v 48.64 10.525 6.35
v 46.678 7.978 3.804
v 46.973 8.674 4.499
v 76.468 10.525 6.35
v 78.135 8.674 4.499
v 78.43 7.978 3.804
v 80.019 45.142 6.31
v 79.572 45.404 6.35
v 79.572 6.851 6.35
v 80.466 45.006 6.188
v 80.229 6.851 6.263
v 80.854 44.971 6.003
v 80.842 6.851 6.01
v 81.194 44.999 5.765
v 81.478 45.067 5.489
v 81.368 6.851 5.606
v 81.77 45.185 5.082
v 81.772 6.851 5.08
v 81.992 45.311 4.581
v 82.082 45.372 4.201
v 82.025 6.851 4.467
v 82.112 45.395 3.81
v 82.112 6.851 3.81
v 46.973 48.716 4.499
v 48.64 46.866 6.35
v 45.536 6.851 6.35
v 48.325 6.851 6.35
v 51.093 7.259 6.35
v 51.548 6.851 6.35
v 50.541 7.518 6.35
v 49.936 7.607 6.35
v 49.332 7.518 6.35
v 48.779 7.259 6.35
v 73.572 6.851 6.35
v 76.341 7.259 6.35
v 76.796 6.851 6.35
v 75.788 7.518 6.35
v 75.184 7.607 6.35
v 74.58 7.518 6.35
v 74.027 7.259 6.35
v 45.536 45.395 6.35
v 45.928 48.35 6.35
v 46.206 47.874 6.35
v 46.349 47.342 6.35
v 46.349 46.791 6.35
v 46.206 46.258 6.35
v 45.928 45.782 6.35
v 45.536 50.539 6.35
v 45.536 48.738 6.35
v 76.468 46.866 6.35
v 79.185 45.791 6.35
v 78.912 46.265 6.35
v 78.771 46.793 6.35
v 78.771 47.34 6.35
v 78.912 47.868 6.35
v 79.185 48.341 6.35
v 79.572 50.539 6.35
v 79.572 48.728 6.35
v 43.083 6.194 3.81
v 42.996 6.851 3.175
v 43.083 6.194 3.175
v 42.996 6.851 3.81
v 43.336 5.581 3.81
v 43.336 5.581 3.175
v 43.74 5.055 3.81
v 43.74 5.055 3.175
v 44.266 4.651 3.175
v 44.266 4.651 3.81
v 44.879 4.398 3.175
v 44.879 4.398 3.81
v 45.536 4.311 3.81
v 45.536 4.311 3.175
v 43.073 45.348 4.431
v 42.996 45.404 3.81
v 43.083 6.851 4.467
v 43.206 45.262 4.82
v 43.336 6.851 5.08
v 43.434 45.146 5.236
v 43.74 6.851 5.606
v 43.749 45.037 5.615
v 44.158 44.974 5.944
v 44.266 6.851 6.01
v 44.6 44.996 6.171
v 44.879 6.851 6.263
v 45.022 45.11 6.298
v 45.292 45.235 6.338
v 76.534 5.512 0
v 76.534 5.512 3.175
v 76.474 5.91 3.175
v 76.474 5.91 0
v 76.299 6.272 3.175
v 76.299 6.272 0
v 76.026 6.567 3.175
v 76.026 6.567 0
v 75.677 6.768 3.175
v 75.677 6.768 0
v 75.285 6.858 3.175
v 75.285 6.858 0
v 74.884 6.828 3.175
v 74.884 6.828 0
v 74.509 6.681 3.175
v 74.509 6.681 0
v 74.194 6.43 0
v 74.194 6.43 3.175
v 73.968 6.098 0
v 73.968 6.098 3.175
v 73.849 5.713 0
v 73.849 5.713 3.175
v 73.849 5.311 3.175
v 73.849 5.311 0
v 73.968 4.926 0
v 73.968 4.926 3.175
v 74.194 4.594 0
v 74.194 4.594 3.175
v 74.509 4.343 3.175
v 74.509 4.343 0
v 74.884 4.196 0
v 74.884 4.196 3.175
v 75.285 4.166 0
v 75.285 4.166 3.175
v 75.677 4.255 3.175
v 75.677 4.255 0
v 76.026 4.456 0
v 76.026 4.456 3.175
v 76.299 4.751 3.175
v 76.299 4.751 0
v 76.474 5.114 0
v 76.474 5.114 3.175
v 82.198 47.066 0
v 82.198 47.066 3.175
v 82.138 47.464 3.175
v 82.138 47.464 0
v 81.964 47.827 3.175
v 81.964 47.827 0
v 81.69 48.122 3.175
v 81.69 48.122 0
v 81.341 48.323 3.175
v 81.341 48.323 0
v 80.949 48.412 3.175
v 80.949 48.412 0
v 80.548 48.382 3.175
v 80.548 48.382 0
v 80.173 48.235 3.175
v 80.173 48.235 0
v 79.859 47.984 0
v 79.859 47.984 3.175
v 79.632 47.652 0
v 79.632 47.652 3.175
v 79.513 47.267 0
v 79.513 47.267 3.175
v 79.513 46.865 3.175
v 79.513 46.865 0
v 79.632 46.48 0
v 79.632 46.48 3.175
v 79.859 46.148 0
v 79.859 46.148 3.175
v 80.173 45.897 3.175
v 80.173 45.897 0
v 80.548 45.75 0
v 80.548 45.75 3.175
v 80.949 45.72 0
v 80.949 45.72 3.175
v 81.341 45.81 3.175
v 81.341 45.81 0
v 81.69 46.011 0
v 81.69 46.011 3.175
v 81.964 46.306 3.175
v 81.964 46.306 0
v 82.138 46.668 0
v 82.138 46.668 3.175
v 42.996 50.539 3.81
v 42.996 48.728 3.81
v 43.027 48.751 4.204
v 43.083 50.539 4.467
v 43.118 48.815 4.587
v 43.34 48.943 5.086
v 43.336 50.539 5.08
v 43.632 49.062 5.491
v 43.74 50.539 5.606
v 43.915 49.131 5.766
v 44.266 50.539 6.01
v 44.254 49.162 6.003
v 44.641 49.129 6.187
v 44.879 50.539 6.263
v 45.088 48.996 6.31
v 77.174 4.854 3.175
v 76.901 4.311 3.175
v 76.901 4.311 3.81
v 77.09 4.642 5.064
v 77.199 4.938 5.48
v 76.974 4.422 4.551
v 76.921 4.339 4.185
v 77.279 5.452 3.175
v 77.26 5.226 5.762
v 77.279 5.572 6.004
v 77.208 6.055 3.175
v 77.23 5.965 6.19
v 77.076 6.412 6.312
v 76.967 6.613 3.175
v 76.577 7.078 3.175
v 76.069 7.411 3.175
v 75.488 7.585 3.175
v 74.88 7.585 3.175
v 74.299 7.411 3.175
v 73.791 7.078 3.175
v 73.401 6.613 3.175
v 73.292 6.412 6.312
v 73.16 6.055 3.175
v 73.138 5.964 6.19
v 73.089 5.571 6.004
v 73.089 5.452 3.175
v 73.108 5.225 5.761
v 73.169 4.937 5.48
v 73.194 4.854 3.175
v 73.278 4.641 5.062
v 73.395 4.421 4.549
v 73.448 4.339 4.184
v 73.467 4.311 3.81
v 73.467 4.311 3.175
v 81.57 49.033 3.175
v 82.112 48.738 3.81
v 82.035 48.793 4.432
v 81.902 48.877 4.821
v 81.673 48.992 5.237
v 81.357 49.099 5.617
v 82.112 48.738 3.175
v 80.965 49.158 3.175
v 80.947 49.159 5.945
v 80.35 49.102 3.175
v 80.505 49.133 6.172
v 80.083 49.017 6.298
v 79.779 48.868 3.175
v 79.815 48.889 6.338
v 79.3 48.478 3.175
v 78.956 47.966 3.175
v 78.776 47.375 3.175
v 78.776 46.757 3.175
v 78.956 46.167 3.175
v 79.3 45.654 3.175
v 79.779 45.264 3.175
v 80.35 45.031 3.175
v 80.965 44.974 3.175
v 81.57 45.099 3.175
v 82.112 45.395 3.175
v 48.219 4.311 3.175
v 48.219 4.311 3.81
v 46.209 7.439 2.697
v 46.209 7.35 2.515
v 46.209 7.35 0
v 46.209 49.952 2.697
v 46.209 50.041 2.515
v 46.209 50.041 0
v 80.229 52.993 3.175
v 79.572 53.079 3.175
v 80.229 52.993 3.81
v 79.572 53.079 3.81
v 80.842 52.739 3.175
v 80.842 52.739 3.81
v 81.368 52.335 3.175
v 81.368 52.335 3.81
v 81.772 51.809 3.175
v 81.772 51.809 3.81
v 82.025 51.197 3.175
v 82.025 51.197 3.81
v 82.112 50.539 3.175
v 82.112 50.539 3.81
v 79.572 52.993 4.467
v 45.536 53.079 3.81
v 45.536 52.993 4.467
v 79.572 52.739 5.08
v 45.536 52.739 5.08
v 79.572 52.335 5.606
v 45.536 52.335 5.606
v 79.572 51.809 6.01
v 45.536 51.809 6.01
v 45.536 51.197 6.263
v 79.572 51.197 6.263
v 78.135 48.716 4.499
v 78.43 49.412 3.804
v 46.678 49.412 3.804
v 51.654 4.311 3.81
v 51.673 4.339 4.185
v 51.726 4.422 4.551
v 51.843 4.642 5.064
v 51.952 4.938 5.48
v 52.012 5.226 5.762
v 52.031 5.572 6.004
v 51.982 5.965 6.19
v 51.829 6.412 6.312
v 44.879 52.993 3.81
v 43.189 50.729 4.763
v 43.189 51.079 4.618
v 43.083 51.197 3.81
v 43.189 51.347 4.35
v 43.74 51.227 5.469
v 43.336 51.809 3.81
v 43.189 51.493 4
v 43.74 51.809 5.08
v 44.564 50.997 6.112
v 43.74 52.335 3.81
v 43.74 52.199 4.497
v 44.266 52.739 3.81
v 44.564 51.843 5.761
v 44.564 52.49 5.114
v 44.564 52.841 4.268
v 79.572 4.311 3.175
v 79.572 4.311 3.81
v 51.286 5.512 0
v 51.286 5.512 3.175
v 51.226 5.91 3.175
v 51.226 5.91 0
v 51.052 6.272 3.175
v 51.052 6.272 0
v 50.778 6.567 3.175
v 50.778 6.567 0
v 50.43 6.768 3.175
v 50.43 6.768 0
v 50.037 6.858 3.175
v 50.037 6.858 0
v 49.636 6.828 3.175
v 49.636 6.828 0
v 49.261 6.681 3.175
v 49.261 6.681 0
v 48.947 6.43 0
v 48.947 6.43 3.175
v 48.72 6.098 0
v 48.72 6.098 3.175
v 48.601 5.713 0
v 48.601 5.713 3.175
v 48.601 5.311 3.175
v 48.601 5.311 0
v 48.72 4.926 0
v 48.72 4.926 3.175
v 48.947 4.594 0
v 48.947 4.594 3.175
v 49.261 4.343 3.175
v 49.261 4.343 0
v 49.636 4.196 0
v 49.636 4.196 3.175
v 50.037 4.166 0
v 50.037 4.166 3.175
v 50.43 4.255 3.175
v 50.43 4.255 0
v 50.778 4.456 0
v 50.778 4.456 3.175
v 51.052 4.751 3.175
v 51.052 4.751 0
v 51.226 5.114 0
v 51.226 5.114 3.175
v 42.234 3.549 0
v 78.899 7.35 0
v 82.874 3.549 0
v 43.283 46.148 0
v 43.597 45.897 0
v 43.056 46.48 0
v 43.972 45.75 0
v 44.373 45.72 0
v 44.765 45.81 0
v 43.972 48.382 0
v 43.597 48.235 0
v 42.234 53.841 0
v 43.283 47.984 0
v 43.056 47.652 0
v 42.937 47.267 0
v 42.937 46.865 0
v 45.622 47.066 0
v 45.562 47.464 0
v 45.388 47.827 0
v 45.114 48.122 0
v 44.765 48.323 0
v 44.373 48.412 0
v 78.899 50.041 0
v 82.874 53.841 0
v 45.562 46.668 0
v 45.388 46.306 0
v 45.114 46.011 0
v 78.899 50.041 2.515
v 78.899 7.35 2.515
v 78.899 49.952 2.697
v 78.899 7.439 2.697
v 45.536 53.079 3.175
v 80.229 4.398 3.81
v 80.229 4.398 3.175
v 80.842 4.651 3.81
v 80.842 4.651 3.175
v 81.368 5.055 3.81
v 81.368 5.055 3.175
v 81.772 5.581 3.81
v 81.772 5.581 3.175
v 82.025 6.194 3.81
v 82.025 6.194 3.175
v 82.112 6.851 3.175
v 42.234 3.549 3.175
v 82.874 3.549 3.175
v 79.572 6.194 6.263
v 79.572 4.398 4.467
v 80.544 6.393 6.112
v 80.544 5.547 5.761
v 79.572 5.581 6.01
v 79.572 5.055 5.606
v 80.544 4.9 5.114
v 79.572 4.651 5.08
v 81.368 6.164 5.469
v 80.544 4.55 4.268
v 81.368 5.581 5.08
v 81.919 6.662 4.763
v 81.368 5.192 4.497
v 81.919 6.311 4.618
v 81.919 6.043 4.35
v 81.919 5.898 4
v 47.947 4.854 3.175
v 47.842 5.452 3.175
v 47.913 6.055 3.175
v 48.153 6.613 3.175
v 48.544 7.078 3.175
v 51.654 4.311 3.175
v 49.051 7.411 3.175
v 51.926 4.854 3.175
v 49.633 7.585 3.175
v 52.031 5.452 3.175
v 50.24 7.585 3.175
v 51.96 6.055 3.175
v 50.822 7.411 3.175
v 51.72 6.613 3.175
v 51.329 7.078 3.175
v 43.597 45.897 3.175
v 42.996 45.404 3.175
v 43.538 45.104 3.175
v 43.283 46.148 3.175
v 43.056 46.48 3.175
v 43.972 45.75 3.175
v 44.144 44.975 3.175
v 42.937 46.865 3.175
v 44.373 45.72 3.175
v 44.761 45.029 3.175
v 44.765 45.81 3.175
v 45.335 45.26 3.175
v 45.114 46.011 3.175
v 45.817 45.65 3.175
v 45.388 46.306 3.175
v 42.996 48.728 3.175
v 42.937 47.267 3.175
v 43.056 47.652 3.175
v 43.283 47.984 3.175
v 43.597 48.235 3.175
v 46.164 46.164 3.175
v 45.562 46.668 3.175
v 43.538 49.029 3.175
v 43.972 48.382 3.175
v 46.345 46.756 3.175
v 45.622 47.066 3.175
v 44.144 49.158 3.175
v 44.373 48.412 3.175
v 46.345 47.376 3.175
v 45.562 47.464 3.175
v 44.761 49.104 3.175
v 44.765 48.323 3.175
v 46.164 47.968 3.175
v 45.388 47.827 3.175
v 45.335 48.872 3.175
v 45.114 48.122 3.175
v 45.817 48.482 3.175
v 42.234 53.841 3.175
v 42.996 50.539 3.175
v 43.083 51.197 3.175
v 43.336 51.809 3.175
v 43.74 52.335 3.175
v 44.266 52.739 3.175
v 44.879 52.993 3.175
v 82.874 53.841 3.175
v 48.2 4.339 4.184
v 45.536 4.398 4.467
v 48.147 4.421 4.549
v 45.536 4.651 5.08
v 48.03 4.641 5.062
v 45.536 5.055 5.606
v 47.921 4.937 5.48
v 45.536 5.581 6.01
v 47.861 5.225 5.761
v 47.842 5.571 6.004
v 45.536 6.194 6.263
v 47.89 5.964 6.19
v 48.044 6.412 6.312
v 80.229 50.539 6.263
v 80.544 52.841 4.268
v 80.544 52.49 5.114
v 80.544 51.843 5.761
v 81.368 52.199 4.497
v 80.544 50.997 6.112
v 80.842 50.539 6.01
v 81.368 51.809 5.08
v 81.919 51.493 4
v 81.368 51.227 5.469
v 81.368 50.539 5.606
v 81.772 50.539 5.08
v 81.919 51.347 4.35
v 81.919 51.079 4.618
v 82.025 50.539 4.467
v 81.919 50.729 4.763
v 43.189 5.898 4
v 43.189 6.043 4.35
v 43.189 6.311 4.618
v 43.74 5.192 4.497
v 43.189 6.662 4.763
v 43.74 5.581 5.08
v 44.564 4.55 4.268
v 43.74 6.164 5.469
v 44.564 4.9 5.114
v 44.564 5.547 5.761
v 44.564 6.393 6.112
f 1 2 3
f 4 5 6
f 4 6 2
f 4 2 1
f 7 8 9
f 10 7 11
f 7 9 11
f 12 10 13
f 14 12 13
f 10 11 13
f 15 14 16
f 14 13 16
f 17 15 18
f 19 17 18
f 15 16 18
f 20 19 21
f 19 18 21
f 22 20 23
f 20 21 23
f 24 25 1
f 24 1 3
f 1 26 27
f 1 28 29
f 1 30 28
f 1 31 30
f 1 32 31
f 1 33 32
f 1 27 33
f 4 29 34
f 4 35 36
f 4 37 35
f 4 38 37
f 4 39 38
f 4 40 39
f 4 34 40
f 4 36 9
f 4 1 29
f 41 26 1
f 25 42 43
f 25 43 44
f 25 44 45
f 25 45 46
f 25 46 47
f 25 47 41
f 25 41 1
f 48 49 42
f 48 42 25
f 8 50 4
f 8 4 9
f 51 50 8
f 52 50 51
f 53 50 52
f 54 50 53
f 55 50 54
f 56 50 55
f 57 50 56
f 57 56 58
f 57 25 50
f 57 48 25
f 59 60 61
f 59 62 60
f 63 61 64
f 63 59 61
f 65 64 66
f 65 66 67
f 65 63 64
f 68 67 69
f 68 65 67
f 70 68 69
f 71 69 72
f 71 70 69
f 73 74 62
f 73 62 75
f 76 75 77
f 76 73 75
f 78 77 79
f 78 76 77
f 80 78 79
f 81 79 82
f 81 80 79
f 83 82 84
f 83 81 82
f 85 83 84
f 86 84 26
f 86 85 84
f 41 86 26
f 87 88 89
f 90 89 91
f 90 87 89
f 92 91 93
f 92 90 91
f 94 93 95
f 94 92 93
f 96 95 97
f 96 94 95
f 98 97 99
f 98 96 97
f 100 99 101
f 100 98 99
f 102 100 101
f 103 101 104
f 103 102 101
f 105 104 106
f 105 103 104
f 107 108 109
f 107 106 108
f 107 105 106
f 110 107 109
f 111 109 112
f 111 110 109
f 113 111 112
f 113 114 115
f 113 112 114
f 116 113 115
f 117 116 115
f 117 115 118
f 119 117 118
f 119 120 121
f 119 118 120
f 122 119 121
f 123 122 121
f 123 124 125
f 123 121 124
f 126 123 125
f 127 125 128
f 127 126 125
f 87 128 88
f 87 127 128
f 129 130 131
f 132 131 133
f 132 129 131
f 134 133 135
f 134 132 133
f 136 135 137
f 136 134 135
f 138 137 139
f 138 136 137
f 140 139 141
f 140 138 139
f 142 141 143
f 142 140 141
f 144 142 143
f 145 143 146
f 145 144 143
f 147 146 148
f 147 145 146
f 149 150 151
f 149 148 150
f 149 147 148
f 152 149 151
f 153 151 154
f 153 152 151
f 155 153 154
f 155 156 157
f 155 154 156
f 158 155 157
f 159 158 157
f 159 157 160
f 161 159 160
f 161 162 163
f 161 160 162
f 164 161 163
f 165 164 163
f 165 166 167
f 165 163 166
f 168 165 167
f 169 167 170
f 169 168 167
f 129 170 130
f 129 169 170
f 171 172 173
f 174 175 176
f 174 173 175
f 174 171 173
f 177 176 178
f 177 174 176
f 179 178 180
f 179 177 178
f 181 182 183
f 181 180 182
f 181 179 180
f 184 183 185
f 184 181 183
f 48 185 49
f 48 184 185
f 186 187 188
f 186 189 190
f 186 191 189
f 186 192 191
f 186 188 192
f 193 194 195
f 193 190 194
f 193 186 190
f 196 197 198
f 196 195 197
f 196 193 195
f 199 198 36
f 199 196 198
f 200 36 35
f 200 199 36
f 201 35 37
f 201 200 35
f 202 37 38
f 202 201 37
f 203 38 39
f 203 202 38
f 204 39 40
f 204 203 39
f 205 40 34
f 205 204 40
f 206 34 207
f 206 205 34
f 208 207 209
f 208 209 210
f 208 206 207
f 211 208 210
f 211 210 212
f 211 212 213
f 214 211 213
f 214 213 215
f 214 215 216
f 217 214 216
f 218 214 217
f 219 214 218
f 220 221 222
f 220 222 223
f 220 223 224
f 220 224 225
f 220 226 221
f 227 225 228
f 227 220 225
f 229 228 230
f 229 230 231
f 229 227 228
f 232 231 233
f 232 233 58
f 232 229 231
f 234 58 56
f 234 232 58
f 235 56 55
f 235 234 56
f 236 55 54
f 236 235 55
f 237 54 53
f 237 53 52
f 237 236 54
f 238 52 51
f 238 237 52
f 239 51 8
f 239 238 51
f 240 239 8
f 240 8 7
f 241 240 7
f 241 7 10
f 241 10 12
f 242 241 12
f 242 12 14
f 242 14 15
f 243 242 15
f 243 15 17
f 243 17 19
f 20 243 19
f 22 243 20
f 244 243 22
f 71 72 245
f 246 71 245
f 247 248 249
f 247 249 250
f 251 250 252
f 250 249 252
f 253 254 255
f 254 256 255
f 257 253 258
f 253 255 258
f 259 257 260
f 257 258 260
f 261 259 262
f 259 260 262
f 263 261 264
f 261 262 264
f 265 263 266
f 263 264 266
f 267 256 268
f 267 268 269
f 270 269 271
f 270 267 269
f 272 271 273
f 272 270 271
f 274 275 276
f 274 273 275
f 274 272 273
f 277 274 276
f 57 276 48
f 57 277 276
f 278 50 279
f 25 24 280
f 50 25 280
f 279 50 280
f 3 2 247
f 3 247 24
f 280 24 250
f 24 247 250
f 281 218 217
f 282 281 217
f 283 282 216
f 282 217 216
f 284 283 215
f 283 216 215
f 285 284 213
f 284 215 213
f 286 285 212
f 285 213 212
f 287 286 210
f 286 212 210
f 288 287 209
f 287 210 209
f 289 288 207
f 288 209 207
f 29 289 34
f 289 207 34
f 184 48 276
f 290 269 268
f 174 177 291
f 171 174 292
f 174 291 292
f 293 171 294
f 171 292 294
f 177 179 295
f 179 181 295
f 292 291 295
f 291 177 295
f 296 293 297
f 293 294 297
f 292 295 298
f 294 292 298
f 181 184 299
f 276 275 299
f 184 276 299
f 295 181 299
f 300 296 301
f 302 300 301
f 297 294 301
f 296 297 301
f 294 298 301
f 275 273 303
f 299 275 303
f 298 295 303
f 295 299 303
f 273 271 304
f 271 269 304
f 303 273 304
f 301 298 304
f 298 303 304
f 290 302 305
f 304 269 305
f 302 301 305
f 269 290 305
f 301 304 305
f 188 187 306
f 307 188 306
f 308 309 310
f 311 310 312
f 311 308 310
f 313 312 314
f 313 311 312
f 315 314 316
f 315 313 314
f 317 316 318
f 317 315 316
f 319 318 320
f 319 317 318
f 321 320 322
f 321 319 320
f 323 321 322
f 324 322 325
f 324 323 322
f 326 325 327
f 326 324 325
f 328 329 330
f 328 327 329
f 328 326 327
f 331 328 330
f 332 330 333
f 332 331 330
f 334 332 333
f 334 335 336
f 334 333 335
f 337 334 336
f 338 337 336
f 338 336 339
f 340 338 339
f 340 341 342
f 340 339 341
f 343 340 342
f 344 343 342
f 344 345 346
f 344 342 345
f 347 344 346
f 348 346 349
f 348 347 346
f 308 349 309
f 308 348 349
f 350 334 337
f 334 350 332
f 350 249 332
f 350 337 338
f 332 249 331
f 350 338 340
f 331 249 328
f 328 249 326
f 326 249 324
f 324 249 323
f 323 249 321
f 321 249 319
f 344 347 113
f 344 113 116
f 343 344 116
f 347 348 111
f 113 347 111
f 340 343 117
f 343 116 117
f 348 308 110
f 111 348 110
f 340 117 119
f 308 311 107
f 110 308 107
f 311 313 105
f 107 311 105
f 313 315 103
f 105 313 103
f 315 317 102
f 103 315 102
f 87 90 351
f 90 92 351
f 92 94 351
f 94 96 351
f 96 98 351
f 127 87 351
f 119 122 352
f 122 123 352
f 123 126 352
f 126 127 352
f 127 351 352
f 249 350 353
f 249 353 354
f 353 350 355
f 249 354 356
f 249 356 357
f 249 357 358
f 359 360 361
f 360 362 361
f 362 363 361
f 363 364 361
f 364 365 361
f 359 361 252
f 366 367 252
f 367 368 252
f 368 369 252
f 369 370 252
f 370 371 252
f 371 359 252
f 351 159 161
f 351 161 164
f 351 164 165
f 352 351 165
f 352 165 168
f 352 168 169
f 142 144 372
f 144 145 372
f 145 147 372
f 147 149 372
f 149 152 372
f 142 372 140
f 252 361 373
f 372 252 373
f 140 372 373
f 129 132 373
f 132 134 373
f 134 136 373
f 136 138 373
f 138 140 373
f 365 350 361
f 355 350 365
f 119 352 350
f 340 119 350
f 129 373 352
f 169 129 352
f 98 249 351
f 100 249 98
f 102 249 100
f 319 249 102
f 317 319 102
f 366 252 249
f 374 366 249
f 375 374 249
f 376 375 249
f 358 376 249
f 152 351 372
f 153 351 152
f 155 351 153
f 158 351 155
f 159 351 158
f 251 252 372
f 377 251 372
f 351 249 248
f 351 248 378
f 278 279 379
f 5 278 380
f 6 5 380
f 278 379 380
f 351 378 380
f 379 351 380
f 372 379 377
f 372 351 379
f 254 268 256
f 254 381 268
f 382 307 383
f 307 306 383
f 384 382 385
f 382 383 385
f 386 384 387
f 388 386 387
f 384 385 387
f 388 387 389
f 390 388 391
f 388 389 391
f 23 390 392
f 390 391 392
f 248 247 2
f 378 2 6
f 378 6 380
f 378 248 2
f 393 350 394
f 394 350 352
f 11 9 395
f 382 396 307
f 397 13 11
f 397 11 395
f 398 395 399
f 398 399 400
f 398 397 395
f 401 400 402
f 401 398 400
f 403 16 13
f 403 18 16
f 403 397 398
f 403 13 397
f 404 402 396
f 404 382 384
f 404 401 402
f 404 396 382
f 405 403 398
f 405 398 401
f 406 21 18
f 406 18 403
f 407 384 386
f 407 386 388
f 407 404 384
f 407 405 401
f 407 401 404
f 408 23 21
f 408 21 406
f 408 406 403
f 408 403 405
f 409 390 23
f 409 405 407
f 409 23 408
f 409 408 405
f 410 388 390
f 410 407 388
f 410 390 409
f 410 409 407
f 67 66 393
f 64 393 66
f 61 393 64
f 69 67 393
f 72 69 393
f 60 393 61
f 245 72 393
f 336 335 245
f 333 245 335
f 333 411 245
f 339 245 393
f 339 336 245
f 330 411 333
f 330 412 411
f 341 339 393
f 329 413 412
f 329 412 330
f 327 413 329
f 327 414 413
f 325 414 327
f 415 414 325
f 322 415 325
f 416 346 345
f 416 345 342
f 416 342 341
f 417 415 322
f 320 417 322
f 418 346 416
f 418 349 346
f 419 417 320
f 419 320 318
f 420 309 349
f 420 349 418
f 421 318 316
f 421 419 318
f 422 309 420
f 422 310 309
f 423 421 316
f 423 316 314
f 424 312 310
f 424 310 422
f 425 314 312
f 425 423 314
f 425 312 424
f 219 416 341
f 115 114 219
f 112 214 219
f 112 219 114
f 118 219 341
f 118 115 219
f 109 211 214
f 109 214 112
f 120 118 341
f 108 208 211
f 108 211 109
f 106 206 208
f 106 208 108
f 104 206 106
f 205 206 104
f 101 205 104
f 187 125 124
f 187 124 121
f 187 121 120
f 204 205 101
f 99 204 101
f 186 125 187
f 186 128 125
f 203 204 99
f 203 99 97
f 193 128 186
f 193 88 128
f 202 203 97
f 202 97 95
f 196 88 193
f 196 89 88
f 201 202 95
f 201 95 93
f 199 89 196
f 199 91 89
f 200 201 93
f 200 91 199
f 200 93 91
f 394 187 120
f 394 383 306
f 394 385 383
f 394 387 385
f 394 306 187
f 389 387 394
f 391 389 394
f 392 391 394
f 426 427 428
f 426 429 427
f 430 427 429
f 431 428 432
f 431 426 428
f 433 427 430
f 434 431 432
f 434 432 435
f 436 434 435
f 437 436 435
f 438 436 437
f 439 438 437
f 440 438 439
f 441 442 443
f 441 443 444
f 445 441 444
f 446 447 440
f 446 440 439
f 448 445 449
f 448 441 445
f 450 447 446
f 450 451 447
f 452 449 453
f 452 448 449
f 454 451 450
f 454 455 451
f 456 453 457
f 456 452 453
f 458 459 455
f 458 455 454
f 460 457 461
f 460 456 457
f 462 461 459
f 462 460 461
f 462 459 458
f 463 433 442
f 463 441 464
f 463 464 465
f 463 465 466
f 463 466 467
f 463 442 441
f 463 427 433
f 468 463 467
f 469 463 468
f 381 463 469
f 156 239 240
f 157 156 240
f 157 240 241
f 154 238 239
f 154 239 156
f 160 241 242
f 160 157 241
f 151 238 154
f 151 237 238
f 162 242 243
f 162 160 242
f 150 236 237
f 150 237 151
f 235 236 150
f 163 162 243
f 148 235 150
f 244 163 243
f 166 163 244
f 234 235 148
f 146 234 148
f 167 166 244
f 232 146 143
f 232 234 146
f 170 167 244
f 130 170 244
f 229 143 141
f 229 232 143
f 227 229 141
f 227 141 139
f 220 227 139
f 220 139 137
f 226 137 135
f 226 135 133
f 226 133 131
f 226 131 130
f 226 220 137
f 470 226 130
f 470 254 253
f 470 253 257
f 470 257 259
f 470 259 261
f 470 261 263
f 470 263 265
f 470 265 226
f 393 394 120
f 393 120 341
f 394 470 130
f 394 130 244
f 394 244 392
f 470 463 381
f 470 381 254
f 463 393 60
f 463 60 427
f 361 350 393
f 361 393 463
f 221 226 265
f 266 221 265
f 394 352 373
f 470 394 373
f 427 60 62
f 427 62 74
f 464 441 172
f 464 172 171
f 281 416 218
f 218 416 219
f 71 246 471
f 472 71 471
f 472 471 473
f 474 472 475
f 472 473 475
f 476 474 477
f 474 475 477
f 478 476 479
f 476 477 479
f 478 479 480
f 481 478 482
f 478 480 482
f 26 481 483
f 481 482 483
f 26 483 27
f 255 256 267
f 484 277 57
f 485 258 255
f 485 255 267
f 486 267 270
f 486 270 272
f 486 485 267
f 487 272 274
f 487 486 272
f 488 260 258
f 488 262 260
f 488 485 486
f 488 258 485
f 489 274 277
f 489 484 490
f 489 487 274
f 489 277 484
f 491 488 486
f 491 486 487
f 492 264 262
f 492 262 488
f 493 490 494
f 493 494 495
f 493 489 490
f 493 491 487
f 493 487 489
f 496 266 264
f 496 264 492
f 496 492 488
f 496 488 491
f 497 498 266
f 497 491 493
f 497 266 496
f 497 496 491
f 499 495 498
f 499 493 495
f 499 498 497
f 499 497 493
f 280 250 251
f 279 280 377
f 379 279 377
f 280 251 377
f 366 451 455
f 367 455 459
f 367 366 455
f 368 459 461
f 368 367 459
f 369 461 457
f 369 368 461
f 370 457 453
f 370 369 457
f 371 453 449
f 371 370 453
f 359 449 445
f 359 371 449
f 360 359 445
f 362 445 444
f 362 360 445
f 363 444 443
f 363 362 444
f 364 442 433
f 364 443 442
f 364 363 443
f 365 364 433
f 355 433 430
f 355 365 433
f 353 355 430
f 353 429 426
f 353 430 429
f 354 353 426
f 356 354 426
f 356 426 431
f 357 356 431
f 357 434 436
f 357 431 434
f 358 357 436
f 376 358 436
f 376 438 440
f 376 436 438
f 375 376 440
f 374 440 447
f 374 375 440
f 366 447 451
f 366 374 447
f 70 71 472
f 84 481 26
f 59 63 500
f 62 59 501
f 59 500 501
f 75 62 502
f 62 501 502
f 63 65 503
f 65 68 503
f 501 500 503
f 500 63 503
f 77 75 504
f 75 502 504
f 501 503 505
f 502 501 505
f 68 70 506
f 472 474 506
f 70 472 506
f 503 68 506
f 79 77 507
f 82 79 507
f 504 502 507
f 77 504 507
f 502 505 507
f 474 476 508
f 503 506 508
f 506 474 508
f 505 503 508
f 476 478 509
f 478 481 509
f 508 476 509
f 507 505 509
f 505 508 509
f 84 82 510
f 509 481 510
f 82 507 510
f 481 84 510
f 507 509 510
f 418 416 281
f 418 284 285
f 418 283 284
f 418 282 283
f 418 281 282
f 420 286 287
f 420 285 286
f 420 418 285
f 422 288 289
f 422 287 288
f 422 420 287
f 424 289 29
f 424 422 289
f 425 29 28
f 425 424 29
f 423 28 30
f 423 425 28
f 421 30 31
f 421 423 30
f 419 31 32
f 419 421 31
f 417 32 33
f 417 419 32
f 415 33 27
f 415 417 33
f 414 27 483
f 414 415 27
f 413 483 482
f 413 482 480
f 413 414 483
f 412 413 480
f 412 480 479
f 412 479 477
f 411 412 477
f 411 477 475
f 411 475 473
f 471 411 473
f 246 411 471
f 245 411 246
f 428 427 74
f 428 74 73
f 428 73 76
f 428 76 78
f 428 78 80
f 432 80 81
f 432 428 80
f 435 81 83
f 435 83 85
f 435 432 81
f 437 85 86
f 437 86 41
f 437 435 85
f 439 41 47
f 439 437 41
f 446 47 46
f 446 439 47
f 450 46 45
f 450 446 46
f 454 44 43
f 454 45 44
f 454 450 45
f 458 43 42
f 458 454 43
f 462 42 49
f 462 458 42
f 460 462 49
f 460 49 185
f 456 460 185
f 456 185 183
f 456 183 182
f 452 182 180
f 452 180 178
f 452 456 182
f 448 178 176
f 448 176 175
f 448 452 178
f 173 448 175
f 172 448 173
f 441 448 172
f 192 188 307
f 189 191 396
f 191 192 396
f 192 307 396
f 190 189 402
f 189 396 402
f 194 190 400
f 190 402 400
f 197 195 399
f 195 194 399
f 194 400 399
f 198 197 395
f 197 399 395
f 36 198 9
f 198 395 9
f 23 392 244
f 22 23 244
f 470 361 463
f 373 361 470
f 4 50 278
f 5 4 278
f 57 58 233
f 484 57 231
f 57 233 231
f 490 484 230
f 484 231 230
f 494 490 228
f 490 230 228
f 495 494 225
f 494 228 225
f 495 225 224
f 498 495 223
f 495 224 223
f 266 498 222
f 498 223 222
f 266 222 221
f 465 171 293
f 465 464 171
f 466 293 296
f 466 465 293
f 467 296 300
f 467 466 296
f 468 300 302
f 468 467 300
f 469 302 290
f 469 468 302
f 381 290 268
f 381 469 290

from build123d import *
from OCP.BRepFilletAPI import BRepFilletAPI_MakeChamfer

# Parameters (mm, degrees)
MODEL_W             = 40.64000000000001
MODEL_H             = 50.291999999999994
MODEL_R             = 1.3499999999999979
MODEL_R_2           = 1.3499999999999985
MODEL_R_3           = 1.3500000000000056
MODEL_R_4           = 1.3500000000000065
MODEL_W_2           = 32.69080000000003
MODEL_H_2           = 42.690799999999996
BOSS_EXTRUDE1_DEPTH = 3.175
SKETCH1_W           = 32.69080000000003
SKETCH1_H           = 42.690799999999996
SKETCH1_W_2         = 27.828239916797088
SKETCH1_H_2         = 36.340799999999994
BOSS_EXTRUDE2_DEPTH = 3.175
SKETCH2_W           = 39.116000000000014
SKETCH2_H           = 48.768
SKETCH2_W_2         = 32.69080000000003
SKETCH2_H_2         = 42.690799999999996
BOSS_EXTRUDE4_DEPTH = 3.175
FILLET1_R           = 2.54
FILLET2_R           = 2.54
CHAMFER9_SIZE       = 3.175
CHAMFER9_SIZE_2     = 2.858782841
CHAMFER10_SIZE      = 3.175
SKETCH4_R           = 1.3500000000000065
SKETCH4_R_2         = 1.3499999999999979
SKETCH4_R_3         = 1.3499999999999985
SKETCH4_R_4         = 1.3500000000000056
CUT_EXTRUDE1_DEPTH  = 100.03179502787644
CHAMFER11_SIZE      = 0.889
CHAMFER11_SIZE2     = 0.6602398251627483
CHAMFER12_SIZE      = 1.143
CHAMFER12_SIZE2     = 0.9523797142277386
CUT_EXTRUDE2_START  = -3.175
SKETCH5_R           = 2.0955000000000017
SKETCH5_R_2         = 2.095500000000001
CUT_EXTRUDE2_DEPTH  = 3.175


with BuildPart() as part:
    # Model → Boss-Extrude1 (new body)
    with BuildSketch(Plane.XY):
        with Locations((62.55399712221356, 28.695197306808385)):
            Rectangle(MODEL_W, MODEL_H)
        with Locations((44.272200000000005, 47.066199999999995)):
            Circle(MODEL_R, mode=Mode.SUBTRACT)
        with Locations((49.9364, 5.5118)):
            Circle(MODEL_R_2, mode=Mode.SUBTRACT)
        with Locations((75.184, 5.5118)):
            Circle(MODEL_R_3, mode=Mode.SUBTRACT)
        with Locations((80.84819999999999, 47.066199999999995)):
            Circle(MODEL_R_4, mode=Mode.SUBTRACT)
        with Locations((62.55399712221356, 28.69519730680839)):
            Rectangle(MODEL_W_2, MODEL_H_2, mode=Mode.SUBTRACT)
    extrude(amount=BOSS_EXTRUDE1_DEPTH)



with BuildPart() as body_2:
    # Sketch1 → Boss-Extrude2 (new body)
    with BuildSketch(Plane.XY.offset(3.175)):
        with Locations((62.55399712221356, 28.69519730680839)):
            Rectangle(SKETCH1_W, SKETCH1_H)
        with Locations((62.55399712221356, 28.695197306808385)):
            Rectangle(SKETCH1_W_2, SKETCH1_H_2, mode=Mode.SUBTRACT)
    extrude(amount=BOSS_EXTRUDE2_DEPTH)


with BuildPart() as part_1:
    add(part.part)

    add(body_2.part)  # Boss-Extrude4 merges body 2
    # Sketch2 → Boss-Extrude4 (add)
    with BuildSketch(Plane.XY.offset(3.175)):
        with Locations((62.55399712221356, 28.69519730680838)):
            Rectangle(SKETCH2_W, SKETCH2_H)
        with Locations((62.55399712221356, 28.69519730680839)):
            Rectangle(SKETCH2_W_2, SKETCH2_H_2, mode=Mode.SUBTRACT)
    extrude(amount=BOSS_EXTRUDE4_DEPTH)

    # Fillet1
    fillet1_edges = [part_1.edges().sort_by_distance(p)[0] for p in [
        (62.55399712221356, 4.311197306808385, 6.35),
        (62.55399712221356, 53.07919730680838, 6.35),
    ]]
    fillet(fillet1_edges, radius=FILLET1_R)

    # Fillet2
    fillet2_edges = [part_1.edges().sort_by_distance(p)[0] for p in [
        (82.11199712221357, 52.335248531022216, 5.6060512242138305),
        (82.11199712221357, 5.055146082594554, 5.606051224213831),
        (42.99599712221355, 4.311197306808385, 3.4924999999999997),
        (42.99599712221355, 53.07919730680838, 3.4924999999999997),
        (42.99599712221355, 52.33524853102221, 5.606051224213832),
        (42.99599712221355, 5.055146082594553, 5.6060512242138305),
        (42.99599712221355, 28.69519730680838, 6.35),
        (82.11199712221357, 28.695197306808385, 6.35),
        (82.11199712221357, 53.07919730680838, 3.4924999999999997),
        (82.11199712221357, 4.311197306808385, 3.4924999999999997),
    ]]
    fillet(fillet2_edges, radius=FILLET2_R)

    # Chamfer9
    # the kernel refuses this chamfer: 3.175, 2.858782841 mm, written as the material it takes off along each edge
    with BuildSketch(Plane(origin=(48.639877163815015, 46.86559730680839, 3.175), x_dir=(0, 0, 1), z_dir=(0, -1, 0))) as chamfer9_piece_1_section:
        Polygon((CHAMFER9_SIZE, 0), (0, CHAMFER9_SIZE_2), (0, 0), align=None)
    chamfer9_piece_1 = extrude(amount=36.3408, mode=Mode.PRIVATE)
    chamfer9_piece_1 = split(chamfer9_piece_1, bisect_by=Plane(origin=(46.20859712221354, 46.86559730680839, 3.175), z_dir=(1, 0, 0)), keep=Keep.TOP, mode=Mode.PRIVATE)
    add(chamfer9_piece_1, mode=Mode.SUBTRACT)
    with BuildSketch(Plane(origin=(76.4681170806121, 10.524797306808388, 3.175), x_dir=(0, 0, 1), z_dir=(0, 1, 0))) as chamfer9_piece_2_section:
        Polygon((CHAMFER9_SIZE, 0), (0, CHAMFER9_SIZE_2), (0, 0), align=None)
    chamfer9_piece_2 = extrude(amount=36.3408, mode=Mode.PRIVATE)
    chamfer9_piece_2 = split(chamfer9_piece_2, bisect_by=Plane(origin=(78.89939712221357, 10.524797306808388, 3.175), z_dir=(-1, 0, 0)), keep=Keep.TOP, mode=Mode.PRIVATE)
    add(chamfer9_piece_2, mode=Mode.SUBTRACT)

    # Chamfer10
    # the kernel refuses this chamfer: 3.175 mm, written as the material it takes off along each edge
    with BuildSketch(Plane(origin=(46.208597122214, 46.865597306808, 3.175), x_dir=(0, 1.2309e-13, 1), z_dir=(1, 0, 0))) as chamfer10_piece_1_section:
        Polygon((CHAMFER10_SIZE, 0), (3.908e-13, -CHAMFER10_SIZE), (0, 0), align=None)
    chamfer10_piece_1 = extrude(amount=32.690799999999996, mode=Mode.PRIVATE)
    chamfer10_piece_1 = split(chamfer10_piece_1, bisect_by=Plane(origin=(64.4986511687098, 46.865597306808, 19.643438635932224), z_dir=(-0.7431448254361507, 0, -0.6691306064046639)), keep=Keep.TOP, mode=Mode.PRIVATE)
    chamfer10_piece_1 = split(chamfer10_piece_1, bisect_by=Plane(origin=(45.97250261720881, 46.865597306808, 3.387580447169522), z_dir=(0.7431448254361507, 0, -0.6691306064046639)), keep=Keep.TOP, mode=Mode.PRIVATE)
    add(chamfer10_piece_1, mode=Mode.SUBTRACT)
    with BuildSketch(Plane(origin=(78.899397122214, 10.524797306808, 3.175), x_dir=(1.1e-16, -1, 0), z_dir=(-1, -1.1e-16, 0))) as chamfer10_piece_2_section:
        Polygon((CHAMFER10_SIZE, 0), (-3.908e-13, CHAMFER10_SIZE), (0, 0), align=None)
    chamfer10_piece_2 = extrude(amount=32.690799999999996, mode=Mode.PRIVATE)
    chamfer10_piece_2 = split(chamfer10_piece_2, bisect_by=Plane(origin=(79.13549162721864, 10.524797306808, 3.38758044716903), z_dir=(-0.7431448254361507, 0, -0.6691306064046639)), keep=Keep.TOP, mode=Mode.PRIVATE)
    chamfer10_piece_2 = split(chamfer10_piece_2, bisect_by=Plane(origin=(60.609343075717646, 10.524797306808, 19.64343863593272), z_dir=(0.7431448254361507, 0, -0.6691306064046639)), keep=Keep.TOP, mode=Mode.PRIVATE)
    add(chamfer10_piece_2, mode=Mode.SUBTRACT)

    # Sketch4 → Cut-Extrude1 (cut, through all)
    with BuildSketch(Plane(origin=(0, 0, 0), x_dir=(-1, 0, 0), z_dir=(0, 0, -1))):
        with Locations(Location((-80.84819999999999, 47.066199999999995, 0), (0, 0, 19.032198816))):
            Circle(SKETCH4_R)
        with Locations(Location((-44.272200000000005, 47.066199999999995, 0), (0, 0, 19.032198816))):
            Circle(SKETCH4_R_2)
        with Locations(Location((-49.9364, 5.5118, 0), (0, 0, 297.210156983))):
            Circle(SKETCH4_R_3)
        with Locations(Location((-75.184, 5.5118, 0), (0, 0, 297.210156983))):
            Circle(SKETCH4_R_4)
    extrude(amount=-CUT_EXTRUDE1_DEPTH, mode=Mode.SUBTRACT)

    # Chamfer11: one chamfer whose edges measure the first distance from different faces: ONE call of the kernel's chamfer builder (chamfer() names one face for all edges)
    chamfer11_edges_1 = [part_1.edges().sort_by_distance(p)[0] for p in [
        (62.55399712221356, 50.04059730680839, 3.175),
    ]]
    chamfer11_side_1 = [part_1.faces().sort_by_distance(p)[0] for p in [
        (62.55399712221734, 48.49951336002211, 4.716083946785889),
    ]]
    chamfer11_edges_2 = [part_1.edges().sort_by_distance(p)[0] for p in [
        (62.55399712221356, 7.349797306808389, 3.175),
    ]]
    chamfer11_side_2 = [part_1.faces().sort_by_distance(p)[0] for p in [
        (62.553997122213964, 8.890881253594266, 4.716083946786265),
    ]]
    chamfer11 = BRepFilletAPI_MakeChamfer(part_1.part.solid().wrapped)
    for e in chamfer11_edges_1:
        chamfer11.Add(CHAMFER11_SIZE, CHAMFER11_SIZE2, e.wrapped, chamfer11_side_1[0].wrapped)  # the first distance lies on this face
    for e in chamfer11_edges_2:
        chamfer11.Add(CHAMFER11_SIZE, CHAMFER11_SIZE2, e.wrapped, chamfer11_side_2[0].wrapped)  # the first distance lies on this face
    add(Compound.cast(chamfer11.Shape()), mode=Mode.REPLACE)

    # Chamfer12: one chamfer whose edges measure the first distance from different faces: ONE call of the kernel's chamfer builder (chamfer() names one face for all edges)
    chamfer12_edges_1 = [part_1.edges().sort_by_distance(p)[0] for p in [
        (46.208597122213995, 28.695197306810893, 3.6497899590838045),
    ]]
    chamfer12_side_1 = [part_1.faces().sort_by_distance(p)[0] for p in [
        (47.396342466238764, 28.695197306818734, 4.9689148024186895),
    ]]
    chamfer12_edges_2 = [part_1.edges().sort_by_distance(p)[0] for p in [
        (78.899397122214, 28.695197306805508, 3.6497899590828133),
    ]]
    chamfer12_side_2 = [part_1.faces().sort_by_distance(p)[0] for p in [
        (77.71165177818875, 28.695197306797276, 4.96891480241812),
    ]]
    chamfer12 = BRepFilletAPI_MakeChamfer(part_1.part.solid().wrapped)
    for e in chamfer12_edges_1:
        chamfer12.Add(CHAMFER12_SIZE, CHAMFER12_SIZE2, e.wrapped, chamfer12_side_1[0].wrapped)  # the first distance lies on this face
    for e in chamfer12_edges_2:
        chamfer12.Add(CHAMFER12_SIZE, CHAMFER12_SIZE2, e.wrapped, chamfer12_side_2[0].wrapped)  # the first distance lies on this face
    add(Compound.cast(chamfer12.Shape()), mode=Mode.REPLACE)

    # Sketch5 → Cut-Extrude2 (cut)
    with BuildSketch(Plane.XY.offset(6.35).offset(CUT_EXTRUDE2_START)):
        with Locations((44.272200000000005, 47.066199999999995)):
            Circle(SKETCH5_R)
        with Locations((80.84819999999999, 47.066199999999995)):
            Circle(SKETCH5_R)
        with Locations((75.184, 5.5118)):
            Circle(SKETCH5_R_2)
        with Locations((49.9364, 5.5118)):
            Circle(SKETCH5_R_2)
    extrude(amount=CUT_EXTRUDE2_DEPTH, mode=Mode.SUBTRACT)


solid = part_1.part
